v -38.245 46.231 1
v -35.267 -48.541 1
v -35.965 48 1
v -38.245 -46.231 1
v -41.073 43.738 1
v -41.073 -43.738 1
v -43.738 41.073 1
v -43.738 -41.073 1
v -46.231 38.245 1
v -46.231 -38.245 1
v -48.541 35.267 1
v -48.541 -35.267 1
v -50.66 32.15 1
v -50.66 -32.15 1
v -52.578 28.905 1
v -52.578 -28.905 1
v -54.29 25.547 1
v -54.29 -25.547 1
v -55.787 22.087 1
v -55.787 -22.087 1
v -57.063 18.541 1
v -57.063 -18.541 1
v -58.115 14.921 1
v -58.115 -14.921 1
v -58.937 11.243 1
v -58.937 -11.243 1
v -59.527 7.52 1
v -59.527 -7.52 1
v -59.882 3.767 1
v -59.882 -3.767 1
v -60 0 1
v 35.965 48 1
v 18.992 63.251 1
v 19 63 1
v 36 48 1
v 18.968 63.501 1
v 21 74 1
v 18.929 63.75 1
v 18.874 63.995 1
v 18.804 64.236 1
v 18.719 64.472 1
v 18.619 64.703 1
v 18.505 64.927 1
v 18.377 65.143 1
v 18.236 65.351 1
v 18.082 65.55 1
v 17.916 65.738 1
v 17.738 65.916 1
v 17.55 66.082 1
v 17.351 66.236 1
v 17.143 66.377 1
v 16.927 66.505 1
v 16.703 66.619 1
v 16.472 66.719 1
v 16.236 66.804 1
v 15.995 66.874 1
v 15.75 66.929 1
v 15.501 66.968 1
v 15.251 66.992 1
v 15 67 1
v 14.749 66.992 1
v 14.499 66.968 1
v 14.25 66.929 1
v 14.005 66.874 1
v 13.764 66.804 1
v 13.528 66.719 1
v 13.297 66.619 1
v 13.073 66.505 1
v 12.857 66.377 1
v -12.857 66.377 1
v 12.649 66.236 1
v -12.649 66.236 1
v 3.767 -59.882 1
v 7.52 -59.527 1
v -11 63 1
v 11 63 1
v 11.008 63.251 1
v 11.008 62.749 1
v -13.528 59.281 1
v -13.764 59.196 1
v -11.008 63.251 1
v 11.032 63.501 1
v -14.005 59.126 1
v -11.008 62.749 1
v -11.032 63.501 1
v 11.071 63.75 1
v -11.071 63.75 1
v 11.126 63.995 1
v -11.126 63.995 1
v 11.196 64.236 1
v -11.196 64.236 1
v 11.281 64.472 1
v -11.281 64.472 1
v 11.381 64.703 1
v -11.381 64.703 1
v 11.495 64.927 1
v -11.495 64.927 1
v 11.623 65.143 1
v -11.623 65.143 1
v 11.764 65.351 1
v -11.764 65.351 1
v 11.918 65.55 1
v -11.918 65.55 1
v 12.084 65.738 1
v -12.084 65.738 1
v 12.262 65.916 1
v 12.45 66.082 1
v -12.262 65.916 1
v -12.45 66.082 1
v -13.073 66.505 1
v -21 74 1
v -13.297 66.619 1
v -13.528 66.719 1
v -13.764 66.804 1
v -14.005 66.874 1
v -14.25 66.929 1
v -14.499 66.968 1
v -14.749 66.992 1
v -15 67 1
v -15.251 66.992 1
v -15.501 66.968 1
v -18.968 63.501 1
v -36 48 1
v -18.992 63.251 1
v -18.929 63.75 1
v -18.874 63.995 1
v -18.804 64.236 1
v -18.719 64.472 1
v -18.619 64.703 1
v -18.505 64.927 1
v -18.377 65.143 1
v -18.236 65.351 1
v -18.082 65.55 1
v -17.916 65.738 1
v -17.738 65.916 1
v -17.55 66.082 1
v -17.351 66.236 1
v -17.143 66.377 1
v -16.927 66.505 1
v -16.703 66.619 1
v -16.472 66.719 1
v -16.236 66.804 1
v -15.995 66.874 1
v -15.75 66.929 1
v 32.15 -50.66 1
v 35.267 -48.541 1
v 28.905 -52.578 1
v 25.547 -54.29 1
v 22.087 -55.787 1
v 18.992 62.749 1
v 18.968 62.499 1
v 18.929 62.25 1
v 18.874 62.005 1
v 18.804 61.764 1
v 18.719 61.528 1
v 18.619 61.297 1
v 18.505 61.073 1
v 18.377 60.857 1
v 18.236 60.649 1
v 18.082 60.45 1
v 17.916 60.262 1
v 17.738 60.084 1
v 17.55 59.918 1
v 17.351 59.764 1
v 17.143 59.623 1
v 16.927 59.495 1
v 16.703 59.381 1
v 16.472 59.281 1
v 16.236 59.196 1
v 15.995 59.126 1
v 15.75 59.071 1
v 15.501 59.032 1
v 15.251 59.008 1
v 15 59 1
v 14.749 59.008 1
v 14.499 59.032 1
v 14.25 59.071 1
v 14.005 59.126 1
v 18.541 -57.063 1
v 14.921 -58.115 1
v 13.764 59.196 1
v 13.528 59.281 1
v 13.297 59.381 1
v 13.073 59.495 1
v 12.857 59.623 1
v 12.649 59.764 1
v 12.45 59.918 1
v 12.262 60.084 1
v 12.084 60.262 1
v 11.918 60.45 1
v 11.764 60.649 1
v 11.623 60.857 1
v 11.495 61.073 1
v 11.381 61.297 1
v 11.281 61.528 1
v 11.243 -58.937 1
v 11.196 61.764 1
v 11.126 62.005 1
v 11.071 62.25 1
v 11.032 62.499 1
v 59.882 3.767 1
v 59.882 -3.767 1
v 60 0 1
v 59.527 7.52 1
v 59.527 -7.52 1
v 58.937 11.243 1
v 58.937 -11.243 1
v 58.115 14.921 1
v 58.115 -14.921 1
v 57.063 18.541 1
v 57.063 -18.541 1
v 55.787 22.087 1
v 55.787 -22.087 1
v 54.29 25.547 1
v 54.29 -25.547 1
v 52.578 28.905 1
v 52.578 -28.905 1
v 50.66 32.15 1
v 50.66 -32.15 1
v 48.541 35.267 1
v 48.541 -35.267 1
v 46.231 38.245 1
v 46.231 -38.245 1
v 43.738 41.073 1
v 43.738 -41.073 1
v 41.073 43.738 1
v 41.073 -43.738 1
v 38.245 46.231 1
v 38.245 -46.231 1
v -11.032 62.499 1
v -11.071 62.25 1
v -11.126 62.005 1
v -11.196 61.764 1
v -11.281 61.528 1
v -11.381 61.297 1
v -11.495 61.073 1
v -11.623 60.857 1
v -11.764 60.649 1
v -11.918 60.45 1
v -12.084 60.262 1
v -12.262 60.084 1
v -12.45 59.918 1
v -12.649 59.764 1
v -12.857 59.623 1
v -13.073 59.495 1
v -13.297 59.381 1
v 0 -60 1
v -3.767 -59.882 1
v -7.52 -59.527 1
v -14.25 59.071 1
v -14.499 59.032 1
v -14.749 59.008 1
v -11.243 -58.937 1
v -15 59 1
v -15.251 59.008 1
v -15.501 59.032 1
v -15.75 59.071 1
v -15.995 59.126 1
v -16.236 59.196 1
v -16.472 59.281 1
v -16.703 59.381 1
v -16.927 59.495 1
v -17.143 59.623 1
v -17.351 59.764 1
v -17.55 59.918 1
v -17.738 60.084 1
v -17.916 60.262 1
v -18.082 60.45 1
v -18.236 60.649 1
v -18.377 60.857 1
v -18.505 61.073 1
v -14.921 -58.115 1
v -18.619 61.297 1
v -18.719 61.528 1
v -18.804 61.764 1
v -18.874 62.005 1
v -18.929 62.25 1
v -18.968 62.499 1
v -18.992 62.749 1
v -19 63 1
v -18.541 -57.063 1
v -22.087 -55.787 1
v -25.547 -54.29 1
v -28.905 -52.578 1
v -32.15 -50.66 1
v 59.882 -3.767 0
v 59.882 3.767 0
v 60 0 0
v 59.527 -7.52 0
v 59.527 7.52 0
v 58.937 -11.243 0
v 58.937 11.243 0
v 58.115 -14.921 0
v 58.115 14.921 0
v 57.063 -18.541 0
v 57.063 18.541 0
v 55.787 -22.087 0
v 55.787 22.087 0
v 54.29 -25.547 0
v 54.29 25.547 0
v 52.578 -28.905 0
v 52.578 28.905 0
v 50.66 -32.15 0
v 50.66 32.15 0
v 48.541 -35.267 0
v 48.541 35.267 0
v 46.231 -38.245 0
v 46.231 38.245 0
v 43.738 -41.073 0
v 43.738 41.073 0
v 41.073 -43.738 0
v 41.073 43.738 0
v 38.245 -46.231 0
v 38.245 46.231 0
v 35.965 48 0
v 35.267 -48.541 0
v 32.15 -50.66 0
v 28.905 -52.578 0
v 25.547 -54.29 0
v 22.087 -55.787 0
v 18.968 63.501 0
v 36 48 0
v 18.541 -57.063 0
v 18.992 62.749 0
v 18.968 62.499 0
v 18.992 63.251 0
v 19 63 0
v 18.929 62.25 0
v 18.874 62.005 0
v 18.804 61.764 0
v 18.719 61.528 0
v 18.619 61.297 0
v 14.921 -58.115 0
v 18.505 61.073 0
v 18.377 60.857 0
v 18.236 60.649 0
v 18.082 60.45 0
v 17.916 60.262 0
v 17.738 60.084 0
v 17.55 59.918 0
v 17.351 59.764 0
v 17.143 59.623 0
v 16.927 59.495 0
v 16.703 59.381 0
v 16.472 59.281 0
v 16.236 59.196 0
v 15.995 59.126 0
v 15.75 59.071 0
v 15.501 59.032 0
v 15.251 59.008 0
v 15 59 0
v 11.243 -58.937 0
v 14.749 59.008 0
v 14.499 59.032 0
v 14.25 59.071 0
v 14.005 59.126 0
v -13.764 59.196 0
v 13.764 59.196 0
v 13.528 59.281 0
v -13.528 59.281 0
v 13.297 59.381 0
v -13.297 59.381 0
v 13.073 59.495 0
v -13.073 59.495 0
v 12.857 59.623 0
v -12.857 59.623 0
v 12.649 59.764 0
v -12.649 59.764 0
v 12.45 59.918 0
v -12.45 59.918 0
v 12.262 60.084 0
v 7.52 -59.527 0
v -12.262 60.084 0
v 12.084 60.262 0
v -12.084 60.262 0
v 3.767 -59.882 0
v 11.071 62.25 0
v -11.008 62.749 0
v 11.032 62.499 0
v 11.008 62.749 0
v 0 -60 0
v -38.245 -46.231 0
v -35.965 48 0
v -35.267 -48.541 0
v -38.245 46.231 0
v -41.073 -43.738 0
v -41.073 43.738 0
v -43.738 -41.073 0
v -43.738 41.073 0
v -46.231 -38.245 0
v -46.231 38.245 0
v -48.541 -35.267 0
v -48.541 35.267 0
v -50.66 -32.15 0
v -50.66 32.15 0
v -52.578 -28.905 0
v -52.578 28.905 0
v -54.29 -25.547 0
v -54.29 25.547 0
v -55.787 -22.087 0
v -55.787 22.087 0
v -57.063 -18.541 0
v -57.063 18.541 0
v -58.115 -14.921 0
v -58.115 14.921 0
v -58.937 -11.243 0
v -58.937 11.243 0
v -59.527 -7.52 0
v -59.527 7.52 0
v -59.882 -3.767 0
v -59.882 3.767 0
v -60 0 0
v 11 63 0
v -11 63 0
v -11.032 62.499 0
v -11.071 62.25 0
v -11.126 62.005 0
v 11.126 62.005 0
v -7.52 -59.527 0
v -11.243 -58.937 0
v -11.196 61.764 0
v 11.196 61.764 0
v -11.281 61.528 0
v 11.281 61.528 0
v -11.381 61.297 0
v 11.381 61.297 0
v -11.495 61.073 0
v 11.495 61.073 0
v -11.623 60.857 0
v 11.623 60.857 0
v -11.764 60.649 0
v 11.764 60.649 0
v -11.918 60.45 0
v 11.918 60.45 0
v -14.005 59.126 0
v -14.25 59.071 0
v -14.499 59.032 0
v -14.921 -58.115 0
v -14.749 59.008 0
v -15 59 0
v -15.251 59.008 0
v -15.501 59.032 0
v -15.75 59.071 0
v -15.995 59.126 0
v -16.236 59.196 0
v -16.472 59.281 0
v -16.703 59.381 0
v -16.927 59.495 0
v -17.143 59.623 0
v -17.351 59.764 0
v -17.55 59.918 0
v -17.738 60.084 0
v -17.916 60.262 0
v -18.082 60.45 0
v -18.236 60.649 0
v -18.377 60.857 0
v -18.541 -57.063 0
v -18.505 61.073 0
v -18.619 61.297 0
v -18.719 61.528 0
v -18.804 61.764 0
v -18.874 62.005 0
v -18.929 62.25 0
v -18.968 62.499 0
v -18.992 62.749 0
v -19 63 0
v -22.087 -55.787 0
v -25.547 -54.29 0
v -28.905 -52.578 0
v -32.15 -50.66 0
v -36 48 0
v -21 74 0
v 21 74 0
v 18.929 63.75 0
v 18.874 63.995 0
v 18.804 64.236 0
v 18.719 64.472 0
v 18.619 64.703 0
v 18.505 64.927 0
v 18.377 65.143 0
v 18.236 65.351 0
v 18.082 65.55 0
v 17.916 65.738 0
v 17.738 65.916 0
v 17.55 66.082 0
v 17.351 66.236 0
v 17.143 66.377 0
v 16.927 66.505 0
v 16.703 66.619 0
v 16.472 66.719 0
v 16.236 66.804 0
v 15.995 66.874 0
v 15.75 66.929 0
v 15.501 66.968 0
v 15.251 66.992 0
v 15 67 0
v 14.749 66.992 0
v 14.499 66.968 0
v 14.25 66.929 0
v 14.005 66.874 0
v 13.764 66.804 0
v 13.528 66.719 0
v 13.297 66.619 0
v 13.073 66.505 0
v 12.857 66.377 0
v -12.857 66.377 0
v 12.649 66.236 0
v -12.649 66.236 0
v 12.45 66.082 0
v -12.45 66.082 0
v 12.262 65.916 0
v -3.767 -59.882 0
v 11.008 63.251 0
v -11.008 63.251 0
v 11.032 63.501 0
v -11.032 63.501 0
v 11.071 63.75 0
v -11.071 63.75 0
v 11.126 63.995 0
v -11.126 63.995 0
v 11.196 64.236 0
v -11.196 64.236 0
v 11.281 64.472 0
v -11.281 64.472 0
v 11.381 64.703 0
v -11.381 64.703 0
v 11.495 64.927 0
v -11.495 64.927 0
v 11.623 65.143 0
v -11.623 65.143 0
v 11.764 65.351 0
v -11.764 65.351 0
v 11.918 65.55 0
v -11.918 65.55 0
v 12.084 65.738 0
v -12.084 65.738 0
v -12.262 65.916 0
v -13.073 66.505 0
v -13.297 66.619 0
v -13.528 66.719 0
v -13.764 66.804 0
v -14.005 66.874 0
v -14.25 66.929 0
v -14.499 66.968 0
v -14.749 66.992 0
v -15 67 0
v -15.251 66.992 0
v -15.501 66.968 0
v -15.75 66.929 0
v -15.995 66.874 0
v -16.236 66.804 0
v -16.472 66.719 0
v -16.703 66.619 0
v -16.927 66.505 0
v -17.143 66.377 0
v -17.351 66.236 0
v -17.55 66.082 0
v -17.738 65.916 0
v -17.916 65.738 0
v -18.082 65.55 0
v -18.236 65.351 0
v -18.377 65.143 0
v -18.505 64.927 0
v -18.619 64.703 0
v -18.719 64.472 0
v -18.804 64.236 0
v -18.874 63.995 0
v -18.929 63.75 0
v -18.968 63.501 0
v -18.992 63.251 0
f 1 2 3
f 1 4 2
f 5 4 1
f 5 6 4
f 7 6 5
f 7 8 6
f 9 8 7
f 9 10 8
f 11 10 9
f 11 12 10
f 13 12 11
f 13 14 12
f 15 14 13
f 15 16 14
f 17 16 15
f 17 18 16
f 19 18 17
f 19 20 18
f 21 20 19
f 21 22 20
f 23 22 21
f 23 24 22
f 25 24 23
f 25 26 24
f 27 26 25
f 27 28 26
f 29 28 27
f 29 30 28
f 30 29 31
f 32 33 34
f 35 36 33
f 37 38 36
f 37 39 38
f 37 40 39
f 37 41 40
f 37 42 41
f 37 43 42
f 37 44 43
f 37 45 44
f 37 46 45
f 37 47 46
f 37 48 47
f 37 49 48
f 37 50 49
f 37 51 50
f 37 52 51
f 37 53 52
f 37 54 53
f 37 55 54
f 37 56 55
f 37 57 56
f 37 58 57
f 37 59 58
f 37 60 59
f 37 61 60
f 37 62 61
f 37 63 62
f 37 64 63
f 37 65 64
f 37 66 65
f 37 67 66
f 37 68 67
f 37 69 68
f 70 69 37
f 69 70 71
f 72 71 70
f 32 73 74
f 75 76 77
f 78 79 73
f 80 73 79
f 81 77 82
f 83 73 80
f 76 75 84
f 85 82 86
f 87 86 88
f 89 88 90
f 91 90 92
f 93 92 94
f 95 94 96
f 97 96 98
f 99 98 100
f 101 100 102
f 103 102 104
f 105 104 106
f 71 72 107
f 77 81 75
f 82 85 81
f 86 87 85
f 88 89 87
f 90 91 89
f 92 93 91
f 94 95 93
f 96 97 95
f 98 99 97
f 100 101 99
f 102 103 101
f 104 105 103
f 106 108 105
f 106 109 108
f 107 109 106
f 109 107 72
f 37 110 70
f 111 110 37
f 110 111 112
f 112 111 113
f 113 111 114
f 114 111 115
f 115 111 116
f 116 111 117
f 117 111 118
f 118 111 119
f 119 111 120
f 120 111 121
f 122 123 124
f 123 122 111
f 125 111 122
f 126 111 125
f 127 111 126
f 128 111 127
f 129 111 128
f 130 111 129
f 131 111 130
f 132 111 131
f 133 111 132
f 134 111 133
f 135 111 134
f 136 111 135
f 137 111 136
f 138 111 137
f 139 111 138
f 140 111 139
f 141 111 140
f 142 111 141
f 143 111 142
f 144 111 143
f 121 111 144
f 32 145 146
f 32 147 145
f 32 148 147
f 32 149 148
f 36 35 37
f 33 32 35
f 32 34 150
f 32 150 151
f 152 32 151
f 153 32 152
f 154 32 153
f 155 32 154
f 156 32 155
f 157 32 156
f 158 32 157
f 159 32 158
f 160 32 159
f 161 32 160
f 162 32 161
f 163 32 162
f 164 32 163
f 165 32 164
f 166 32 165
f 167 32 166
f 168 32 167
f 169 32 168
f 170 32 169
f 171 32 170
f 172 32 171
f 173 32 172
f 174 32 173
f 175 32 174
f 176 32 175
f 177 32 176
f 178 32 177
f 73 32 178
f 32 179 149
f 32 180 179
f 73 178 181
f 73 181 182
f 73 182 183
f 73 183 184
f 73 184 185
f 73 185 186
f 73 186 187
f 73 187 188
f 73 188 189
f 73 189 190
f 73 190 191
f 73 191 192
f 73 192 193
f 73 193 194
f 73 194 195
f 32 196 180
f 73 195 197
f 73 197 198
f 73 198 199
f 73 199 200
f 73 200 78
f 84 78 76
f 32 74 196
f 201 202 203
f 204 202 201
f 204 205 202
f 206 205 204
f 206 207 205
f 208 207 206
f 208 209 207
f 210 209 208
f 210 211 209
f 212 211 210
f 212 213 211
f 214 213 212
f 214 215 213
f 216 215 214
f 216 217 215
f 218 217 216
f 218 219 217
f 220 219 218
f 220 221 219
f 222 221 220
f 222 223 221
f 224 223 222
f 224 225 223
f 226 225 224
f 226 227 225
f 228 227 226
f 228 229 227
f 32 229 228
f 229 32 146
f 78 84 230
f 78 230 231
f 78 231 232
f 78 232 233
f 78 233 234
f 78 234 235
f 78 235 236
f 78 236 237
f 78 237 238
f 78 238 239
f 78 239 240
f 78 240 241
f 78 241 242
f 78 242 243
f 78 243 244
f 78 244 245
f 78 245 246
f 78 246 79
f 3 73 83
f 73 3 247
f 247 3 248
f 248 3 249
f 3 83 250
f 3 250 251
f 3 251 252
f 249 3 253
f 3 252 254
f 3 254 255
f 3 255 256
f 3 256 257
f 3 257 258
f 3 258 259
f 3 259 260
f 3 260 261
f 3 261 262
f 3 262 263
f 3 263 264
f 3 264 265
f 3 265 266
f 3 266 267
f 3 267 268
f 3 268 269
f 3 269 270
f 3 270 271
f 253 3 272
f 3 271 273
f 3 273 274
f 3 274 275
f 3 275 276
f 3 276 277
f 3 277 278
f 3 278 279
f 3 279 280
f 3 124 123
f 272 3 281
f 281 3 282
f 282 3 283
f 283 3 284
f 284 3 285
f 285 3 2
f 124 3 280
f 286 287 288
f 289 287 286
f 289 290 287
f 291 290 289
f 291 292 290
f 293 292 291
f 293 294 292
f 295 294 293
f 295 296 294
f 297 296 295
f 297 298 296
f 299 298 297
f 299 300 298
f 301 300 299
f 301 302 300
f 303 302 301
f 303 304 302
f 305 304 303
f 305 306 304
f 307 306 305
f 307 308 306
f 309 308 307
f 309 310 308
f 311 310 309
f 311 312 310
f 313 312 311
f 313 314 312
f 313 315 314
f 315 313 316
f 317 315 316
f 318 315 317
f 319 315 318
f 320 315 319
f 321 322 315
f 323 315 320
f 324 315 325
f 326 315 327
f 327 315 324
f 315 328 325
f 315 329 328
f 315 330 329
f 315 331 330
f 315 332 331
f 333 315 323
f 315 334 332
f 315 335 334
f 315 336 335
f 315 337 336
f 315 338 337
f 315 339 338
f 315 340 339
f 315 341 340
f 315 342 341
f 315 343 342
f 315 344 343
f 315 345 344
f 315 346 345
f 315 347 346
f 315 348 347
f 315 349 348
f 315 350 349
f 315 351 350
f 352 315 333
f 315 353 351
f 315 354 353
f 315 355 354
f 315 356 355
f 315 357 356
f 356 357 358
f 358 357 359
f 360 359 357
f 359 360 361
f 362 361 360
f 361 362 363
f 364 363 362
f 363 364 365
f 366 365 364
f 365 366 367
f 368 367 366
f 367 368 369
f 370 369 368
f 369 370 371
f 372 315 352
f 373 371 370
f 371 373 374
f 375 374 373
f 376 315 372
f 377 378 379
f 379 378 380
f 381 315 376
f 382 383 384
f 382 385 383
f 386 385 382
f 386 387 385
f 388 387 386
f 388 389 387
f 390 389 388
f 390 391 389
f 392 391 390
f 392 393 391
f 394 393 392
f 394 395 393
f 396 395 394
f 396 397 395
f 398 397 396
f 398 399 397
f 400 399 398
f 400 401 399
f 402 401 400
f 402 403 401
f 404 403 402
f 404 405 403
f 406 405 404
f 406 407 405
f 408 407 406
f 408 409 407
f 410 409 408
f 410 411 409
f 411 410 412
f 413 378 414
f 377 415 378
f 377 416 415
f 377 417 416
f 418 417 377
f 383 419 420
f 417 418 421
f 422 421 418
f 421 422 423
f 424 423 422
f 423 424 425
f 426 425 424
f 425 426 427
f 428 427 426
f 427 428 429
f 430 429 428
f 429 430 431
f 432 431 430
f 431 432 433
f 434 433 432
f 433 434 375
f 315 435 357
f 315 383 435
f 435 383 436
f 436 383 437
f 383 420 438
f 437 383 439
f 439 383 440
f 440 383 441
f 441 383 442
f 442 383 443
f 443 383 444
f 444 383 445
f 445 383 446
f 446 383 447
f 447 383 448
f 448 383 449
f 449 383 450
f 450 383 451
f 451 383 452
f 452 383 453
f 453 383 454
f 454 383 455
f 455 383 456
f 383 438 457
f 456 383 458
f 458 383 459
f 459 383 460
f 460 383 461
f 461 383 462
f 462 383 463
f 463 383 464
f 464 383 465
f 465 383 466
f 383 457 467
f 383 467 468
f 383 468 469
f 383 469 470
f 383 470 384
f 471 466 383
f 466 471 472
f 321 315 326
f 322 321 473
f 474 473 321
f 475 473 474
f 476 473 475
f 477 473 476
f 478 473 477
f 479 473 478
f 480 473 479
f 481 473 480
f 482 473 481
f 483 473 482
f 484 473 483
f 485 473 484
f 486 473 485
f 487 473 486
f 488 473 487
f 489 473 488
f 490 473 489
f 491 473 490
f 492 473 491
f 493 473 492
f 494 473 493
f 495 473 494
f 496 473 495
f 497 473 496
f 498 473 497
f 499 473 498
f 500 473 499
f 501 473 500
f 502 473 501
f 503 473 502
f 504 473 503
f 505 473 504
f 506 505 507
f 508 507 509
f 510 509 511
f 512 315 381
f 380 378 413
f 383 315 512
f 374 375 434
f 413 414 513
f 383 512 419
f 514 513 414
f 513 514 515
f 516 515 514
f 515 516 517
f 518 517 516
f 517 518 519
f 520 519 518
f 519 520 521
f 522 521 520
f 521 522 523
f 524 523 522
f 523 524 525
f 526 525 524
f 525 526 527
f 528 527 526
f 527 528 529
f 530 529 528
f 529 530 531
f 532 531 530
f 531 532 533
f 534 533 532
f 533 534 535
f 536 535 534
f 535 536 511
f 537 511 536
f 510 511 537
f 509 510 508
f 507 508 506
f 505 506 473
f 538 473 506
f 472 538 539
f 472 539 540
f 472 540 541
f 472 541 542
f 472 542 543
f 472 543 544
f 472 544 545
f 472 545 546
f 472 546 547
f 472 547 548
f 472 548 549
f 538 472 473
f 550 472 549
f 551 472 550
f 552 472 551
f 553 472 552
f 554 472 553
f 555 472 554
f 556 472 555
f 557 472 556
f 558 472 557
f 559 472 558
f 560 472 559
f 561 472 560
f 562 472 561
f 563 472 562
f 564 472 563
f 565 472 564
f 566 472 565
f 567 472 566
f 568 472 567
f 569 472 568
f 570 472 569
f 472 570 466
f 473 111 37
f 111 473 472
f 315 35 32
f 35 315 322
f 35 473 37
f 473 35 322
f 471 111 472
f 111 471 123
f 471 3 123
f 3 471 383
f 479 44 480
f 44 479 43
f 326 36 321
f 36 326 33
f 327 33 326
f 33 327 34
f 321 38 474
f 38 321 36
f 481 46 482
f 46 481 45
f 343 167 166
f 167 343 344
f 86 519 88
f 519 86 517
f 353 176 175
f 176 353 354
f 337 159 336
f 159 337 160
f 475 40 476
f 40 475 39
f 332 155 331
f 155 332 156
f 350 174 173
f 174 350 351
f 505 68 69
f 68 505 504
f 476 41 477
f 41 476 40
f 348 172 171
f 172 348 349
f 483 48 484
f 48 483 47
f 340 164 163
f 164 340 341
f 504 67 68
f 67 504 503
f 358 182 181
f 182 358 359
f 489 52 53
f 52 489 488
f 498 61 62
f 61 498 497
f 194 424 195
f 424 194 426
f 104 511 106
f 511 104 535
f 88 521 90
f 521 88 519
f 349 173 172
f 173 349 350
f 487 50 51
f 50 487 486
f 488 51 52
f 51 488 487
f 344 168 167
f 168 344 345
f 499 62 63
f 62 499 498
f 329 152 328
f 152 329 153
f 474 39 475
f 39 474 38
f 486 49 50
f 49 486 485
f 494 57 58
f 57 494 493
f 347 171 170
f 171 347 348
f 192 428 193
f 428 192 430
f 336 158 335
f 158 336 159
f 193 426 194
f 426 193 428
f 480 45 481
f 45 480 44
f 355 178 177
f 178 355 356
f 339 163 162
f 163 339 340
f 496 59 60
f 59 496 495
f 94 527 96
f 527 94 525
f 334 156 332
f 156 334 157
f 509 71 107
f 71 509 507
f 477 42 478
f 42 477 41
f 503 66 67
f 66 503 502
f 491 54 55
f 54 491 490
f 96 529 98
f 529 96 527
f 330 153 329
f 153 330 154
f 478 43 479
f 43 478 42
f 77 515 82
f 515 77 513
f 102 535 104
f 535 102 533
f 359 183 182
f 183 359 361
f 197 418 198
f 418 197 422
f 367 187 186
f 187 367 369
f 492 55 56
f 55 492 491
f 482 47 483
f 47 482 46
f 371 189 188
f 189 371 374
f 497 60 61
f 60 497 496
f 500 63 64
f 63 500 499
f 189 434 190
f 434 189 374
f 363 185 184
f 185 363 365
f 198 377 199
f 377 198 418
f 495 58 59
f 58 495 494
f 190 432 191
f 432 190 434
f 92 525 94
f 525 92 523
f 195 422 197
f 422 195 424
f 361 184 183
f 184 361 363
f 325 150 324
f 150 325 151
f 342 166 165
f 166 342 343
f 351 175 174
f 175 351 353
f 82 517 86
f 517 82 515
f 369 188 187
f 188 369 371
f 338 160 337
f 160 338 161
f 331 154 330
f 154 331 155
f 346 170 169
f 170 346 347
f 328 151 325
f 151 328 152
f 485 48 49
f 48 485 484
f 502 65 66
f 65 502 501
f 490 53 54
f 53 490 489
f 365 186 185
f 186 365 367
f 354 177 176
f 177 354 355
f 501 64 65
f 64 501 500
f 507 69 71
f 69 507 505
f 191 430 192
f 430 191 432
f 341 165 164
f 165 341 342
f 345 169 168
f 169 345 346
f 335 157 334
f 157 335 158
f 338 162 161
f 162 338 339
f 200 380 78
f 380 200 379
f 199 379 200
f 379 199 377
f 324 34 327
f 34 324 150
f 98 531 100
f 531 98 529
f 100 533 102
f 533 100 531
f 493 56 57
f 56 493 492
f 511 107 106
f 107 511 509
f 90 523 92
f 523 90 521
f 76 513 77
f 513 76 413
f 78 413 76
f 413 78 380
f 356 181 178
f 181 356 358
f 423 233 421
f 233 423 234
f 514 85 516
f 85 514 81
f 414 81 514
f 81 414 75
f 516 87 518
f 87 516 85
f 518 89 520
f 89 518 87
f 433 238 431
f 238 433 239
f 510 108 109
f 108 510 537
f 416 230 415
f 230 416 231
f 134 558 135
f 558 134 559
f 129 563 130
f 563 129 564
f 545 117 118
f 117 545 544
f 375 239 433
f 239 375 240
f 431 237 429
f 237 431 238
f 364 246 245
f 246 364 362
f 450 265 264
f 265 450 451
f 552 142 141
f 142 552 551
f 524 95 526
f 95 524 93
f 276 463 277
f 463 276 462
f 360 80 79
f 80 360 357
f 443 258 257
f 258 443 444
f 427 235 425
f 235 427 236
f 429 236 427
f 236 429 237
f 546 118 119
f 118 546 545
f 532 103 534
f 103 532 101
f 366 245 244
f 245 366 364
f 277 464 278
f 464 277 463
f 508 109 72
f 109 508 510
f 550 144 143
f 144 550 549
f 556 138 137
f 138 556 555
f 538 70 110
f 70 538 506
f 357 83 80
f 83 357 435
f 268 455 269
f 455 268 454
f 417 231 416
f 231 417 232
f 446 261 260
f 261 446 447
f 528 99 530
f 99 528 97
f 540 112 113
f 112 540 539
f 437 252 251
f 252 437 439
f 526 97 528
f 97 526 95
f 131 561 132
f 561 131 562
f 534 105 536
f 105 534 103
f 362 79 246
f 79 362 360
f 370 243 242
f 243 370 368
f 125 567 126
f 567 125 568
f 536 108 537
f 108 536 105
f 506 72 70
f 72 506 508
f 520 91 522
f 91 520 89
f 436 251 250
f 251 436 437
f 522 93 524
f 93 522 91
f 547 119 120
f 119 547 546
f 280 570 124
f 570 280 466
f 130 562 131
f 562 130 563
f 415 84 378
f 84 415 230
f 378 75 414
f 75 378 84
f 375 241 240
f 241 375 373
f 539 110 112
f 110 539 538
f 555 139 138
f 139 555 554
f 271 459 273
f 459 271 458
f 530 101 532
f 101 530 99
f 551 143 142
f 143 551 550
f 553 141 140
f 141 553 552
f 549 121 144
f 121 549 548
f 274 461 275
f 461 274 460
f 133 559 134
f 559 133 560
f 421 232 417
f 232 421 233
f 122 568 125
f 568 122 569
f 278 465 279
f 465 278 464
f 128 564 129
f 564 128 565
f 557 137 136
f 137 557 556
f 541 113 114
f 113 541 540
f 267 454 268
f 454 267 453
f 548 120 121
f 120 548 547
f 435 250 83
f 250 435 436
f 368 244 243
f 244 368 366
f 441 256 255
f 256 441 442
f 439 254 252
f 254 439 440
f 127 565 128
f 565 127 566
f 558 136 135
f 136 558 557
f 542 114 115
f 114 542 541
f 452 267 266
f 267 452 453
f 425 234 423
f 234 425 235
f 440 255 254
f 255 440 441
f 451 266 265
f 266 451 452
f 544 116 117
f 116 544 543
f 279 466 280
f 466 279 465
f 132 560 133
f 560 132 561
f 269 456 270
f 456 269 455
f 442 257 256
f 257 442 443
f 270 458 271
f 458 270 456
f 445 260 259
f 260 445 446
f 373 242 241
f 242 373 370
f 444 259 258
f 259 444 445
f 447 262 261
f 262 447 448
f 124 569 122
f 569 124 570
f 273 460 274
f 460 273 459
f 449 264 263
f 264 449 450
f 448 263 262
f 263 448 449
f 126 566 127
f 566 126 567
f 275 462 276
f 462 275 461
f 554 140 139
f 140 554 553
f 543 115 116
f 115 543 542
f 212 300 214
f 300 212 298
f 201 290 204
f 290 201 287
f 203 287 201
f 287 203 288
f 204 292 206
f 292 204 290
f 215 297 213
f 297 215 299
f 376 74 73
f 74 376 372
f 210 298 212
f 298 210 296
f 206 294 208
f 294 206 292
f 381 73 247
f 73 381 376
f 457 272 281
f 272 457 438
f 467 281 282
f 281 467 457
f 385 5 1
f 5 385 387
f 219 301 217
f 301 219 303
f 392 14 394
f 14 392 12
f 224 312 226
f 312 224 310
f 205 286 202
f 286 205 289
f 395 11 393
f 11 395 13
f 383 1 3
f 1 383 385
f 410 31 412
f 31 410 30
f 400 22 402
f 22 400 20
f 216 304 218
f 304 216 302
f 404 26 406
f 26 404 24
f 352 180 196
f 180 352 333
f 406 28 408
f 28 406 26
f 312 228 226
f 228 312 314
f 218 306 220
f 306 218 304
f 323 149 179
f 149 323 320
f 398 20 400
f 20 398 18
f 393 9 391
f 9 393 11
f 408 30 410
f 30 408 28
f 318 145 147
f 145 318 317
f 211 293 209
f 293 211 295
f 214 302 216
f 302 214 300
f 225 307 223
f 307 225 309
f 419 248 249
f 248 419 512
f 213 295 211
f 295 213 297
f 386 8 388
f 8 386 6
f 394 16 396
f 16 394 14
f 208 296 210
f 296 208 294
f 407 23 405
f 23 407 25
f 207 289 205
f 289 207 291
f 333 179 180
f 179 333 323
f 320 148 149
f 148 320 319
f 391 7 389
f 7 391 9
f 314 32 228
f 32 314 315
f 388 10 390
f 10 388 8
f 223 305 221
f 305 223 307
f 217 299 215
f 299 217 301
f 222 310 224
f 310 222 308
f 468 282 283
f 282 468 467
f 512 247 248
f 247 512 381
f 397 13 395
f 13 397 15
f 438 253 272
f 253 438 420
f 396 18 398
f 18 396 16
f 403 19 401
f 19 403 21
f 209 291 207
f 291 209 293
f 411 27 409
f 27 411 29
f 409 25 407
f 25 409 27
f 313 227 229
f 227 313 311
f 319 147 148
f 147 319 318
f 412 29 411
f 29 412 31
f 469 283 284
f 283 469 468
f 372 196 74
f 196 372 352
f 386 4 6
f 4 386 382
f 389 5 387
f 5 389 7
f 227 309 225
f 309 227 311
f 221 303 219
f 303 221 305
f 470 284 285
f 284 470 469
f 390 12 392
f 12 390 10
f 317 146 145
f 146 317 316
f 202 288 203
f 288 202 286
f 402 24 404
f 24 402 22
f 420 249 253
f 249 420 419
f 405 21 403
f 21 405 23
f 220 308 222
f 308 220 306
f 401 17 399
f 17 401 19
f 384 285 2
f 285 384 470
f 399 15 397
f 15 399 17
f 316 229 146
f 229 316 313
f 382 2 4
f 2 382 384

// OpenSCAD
echo(version=version());
// Increase the visual detail
$fn = 100;

module target() {
    cylinder(d=120, h=1); 
    
}

module hanger() {
    color("red")
    translate([-21, 54, 0])
    cube([42,20,1]);
    
    color("red")
    translate([21,48,0])
    rotate([0,0,0])
    linear_extrude(1)
    polygon([[0,0],[15,0],[0,26]]);
    
    color("red")
    translate([-21,48,0])
    rotate([0,0,90])
    linear_extrude(1)
    polygon([[0,0],[26,0],[0,15]]);

}
    
module hangerholes() {
    color("white")
    translate([15,63,-1])
    cylinder(d=8, h=3);
    
    color("white")
    translate([-15,63,-1])
    cylinder(d=8, h=3);
    
}

difference() {
   hanger();
   hangerholes();
    
}

target();
//hangerholes();
